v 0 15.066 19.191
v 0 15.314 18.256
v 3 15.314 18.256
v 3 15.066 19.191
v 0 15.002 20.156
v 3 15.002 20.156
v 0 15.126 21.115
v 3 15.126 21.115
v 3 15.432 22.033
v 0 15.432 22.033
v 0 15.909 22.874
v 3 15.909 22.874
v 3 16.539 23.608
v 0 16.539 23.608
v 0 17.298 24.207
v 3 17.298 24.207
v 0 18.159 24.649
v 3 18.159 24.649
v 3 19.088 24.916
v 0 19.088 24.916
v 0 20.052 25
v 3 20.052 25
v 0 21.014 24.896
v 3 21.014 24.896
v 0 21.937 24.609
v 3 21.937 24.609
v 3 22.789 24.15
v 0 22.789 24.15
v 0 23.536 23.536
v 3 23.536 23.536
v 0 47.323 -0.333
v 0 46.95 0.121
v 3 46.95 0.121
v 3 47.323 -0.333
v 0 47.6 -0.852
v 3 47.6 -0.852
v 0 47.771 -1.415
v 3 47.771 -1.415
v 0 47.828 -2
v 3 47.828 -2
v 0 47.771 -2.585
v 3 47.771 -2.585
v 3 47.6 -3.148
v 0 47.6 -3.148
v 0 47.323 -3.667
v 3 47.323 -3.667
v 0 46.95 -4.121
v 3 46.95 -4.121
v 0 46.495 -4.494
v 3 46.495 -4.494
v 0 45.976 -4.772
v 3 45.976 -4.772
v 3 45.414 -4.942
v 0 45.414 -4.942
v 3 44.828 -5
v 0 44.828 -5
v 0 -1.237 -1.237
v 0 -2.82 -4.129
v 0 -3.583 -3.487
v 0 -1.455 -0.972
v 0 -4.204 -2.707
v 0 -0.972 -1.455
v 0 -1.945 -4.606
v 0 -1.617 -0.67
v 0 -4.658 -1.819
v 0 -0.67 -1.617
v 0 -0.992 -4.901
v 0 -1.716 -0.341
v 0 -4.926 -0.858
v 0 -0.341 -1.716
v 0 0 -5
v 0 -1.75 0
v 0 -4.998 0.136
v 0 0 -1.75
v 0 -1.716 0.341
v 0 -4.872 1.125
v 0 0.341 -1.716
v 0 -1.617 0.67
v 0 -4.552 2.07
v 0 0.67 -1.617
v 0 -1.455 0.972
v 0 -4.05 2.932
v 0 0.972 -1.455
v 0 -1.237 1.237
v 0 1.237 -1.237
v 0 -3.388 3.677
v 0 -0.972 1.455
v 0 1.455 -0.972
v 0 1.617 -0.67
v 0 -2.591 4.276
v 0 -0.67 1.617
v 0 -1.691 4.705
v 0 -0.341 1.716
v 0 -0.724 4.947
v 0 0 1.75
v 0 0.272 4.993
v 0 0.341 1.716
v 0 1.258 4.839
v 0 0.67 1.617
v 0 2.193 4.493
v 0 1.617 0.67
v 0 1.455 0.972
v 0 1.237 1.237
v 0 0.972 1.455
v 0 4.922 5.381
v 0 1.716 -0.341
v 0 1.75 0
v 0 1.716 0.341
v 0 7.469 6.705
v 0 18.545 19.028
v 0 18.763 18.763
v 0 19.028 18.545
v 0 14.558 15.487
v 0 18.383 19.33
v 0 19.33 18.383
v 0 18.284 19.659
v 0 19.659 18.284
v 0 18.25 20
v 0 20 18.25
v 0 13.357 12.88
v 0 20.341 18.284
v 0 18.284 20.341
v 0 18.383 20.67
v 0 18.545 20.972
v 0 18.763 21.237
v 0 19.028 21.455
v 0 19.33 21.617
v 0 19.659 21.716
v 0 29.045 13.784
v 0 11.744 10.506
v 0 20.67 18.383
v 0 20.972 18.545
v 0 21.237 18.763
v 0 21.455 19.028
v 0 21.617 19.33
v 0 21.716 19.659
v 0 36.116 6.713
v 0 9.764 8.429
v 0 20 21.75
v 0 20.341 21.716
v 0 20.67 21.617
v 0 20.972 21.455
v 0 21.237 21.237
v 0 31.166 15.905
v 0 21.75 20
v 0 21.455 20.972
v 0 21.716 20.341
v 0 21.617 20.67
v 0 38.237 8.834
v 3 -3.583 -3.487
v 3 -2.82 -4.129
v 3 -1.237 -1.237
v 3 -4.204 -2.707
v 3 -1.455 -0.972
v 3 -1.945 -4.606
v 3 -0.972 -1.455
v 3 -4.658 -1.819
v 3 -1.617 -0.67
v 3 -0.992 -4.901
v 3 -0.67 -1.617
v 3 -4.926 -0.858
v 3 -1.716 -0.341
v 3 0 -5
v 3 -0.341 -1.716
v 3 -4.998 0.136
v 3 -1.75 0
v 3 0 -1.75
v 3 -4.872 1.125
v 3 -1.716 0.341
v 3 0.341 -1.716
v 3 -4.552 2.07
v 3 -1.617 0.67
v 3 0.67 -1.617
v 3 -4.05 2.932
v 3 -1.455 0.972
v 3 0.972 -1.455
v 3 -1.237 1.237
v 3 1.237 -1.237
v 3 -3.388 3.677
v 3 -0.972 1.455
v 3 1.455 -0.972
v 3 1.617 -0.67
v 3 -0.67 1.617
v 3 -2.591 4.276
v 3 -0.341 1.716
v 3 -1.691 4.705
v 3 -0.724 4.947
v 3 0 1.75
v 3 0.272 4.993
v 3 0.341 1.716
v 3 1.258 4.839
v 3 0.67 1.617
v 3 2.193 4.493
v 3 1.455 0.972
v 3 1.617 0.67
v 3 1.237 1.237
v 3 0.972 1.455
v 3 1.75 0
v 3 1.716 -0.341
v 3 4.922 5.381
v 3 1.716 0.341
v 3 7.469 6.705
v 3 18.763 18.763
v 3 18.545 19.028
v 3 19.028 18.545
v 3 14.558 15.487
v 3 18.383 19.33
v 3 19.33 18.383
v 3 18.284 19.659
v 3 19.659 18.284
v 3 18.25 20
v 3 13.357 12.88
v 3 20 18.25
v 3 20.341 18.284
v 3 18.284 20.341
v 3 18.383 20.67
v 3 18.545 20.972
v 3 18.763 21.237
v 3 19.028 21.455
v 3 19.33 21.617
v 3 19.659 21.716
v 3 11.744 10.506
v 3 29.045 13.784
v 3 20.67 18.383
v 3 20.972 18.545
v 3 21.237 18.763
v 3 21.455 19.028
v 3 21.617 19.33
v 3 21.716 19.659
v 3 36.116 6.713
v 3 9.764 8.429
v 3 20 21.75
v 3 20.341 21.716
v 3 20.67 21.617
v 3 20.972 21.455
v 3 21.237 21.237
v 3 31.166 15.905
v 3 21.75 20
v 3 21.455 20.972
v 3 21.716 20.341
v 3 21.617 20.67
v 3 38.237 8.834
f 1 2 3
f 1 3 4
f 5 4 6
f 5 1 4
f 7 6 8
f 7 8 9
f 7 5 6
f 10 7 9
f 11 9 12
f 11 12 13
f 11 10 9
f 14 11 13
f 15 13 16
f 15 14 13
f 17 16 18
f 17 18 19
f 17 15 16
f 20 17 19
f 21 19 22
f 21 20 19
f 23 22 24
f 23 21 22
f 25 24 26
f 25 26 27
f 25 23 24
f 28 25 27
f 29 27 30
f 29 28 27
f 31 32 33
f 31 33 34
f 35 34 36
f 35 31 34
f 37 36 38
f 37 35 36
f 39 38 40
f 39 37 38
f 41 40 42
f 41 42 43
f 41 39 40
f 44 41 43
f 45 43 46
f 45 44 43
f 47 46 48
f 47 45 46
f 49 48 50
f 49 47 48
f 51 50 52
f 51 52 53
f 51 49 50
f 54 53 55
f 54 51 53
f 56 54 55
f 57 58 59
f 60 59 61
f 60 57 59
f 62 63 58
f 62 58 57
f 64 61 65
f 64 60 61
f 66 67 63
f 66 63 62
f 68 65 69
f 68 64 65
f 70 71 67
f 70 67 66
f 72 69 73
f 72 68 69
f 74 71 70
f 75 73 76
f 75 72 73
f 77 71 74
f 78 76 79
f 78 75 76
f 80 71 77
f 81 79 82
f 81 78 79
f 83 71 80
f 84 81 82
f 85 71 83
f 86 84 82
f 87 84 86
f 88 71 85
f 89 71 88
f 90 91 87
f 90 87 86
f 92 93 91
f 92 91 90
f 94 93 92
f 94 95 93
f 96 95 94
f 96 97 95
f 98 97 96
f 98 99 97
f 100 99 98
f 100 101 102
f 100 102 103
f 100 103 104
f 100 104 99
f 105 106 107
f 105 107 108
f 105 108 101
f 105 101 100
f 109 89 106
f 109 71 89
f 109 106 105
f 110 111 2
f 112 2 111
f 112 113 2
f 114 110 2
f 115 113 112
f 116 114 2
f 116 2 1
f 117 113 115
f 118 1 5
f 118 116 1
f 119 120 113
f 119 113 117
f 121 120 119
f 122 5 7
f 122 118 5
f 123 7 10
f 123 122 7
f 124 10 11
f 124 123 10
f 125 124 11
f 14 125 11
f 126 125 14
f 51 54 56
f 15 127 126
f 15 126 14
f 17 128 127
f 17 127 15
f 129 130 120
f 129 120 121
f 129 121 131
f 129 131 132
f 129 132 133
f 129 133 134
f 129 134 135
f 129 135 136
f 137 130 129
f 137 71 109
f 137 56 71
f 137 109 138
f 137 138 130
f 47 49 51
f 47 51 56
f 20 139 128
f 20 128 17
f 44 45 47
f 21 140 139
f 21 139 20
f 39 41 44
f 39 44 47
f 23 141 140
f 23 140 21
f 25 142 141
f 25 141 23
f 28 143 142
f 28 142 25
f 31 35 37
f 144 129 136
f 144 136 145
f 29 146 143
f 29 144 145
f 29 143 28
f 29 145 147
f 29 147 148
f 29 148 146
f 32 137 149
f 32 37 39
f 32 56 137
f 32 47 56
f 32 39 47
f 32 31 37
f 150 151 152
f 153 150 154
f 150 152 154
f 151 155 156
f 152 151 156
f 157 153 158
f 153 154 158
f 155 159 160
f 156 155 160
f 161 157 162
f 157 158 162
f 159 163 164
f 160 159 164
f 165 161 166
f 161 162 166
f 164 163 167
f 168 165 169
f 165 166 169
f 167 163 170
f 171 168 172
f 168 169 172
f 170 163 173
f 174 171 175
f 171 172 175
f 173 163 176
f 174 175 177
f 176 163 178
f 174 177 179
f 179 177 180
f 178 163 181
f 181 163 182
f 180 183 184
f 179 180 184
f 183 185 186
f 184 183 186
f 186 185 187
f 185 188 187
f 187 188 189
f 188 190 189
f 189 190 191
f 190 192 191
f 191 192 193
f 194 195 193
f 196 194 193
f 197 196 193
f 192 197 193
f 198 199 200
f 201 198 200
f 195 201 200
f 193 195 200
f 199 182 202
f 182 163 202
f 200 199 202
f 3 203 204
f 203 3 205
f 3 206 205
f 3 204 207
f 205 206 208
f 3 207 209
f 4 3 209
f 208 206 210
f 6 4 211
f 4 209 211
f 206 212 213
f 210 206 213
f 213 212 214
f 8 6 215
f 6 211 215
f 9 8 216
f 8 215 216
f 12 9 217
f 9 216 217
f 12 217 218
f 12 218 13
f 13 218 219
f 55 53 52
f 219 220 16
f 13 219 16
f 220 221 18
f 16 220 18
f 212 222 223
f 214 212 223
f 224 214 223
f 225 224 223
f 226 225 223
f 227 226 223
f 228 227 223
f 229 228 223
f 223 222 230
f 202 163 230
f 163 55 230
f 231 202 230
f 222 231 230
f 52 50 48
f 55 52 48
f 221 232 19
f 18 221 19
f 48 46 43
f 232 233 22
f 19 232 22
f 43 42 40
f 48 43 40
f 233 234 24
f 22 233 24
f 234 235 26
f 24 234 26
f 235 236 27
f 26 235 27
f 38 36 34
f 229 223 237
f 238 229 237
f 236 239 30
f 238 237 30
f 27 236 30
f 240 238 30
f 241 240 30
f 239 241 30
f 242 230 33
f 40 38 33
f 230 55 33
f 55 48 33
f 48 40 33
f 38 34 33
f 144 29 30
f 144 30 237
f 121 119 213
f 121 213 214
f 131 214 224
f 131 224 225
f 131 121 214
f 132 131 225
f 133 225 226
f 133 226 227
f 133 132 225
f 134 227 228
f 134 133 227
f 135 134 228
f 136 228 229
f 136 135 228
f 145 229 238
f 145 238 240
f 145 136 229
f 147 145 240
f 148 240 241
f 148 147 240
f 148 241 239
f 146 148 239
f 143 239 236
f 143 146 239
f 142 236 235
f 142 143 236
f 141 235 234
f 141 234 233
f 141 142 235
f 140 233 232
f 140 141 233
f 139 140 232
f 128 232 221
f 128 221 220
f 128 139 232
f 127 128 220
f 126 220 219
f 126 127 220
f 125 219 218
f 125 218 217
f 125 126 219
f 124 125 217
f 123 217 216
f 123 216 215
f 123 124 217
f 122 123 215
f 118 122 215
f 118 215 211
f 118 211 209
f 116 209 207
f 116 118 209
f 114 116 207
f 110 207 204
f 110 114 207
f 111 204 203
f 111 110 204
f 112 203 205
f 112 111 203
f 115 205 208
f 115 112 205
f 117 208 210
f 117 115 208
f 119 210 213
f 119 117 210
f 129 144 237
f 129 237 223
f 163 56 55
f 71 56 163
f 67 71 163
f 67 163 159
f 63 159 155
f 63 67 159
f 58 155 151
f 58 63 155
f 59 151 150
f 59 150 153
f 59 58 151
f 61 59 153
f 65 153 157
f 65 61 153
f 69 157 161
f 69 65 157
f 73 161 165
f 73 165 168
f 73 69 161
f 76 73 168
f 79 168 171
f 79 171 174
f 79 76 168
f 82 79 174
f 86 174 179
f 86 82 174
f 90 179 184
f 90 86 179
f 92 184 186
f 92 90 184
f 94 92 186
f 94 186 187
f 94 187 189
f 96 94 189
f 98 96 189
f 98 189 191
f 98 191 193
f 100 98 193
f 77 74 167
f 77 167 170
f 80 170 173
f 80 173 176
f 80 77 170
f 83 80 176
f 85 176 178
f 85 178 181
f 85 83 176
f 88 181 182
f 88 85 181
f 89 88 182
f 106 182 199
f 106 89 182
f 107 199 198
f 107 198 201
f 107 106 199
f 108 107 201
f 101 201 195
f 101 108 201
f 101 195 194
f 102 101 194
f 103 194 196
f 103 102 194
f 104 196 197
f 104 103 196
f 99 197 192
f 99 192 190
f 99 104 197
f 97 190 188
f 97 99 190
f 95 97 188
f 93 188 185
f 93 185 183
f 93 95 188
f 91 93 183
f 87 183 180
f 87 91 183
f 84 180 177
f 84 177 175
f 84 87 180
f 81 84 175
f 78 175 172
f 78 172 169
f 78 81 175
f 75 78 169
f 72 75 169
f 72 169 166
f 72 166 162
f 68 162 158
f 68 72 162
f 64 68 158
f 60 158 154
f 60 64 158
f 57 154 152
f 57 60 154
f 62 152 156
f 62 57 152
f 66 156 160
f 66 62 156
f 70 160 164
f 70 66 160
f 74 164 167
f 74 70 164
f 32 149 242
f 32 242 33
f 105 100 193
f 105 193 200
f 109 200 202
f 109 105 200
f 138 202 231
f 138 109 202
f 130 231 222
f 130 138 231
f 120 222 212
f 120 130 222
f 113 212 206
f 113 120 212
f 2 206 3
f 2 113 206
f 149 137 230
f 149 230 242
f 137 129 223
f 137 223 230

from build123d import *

# Parameters (mm, degrees)
CROQUIS1_R              = 1.75
SALIENTE_EXTRUIR1_DEPTH = 3


with BuildPart() as part:
    # Croquis1 → Saliente-Extruir1 (new body)
    with BuildSketch(Plane(origin=(0, 0, 0), x_dir=(0, 0, -1), z_dir=(1, 0, 0))):
        with BuildLine():
            Line((-23.535533906, 23.535533906), (-15.90493831, 31.166129502))
            Line((-15.90493831, 31.166129502), (-13.783617966, 29.044809158))
            Line((-13.783617966, 29.044809158), (-6.712550154, 36.11587697))
            Line((-6.712550154, 36.11587697), (-8.833870498, 38.237197314))
            Line((-8.833870498, 38.237197314), (-0.121320344, 46.949747468))
            ThreePointArc((-0.121320344, 46.949747468), (3.148050297, 47.600065722), (5, 44.828427125))
            Line((5, 44.828427125), (5, 0))
            ThreePointArc((5, 0), (-1.125347327, -4.871713599), (-4.493437357, 2.192947952))
            ThreePointArc((-4.493437357, 2.192947952), (-9.426479438, 10.796864219), (-18.255804358, 15.314086902))
            ThreePointArc((-18.255804358, 15.314086902), (-24.207168989, 17.298198916), (-23.535533906, 23.535533906))
        make_face()
        Circle(CROQUIS1_R, mode=Mode.SUBTRACT)
        with Locations((-20, 20)):
            Circle(CROQUIS1_R, mode=Mode.SUBTRACT)
    extrude(amount=SALIENTE_EXTRUIR1_DEPTH)


solid = part.part
